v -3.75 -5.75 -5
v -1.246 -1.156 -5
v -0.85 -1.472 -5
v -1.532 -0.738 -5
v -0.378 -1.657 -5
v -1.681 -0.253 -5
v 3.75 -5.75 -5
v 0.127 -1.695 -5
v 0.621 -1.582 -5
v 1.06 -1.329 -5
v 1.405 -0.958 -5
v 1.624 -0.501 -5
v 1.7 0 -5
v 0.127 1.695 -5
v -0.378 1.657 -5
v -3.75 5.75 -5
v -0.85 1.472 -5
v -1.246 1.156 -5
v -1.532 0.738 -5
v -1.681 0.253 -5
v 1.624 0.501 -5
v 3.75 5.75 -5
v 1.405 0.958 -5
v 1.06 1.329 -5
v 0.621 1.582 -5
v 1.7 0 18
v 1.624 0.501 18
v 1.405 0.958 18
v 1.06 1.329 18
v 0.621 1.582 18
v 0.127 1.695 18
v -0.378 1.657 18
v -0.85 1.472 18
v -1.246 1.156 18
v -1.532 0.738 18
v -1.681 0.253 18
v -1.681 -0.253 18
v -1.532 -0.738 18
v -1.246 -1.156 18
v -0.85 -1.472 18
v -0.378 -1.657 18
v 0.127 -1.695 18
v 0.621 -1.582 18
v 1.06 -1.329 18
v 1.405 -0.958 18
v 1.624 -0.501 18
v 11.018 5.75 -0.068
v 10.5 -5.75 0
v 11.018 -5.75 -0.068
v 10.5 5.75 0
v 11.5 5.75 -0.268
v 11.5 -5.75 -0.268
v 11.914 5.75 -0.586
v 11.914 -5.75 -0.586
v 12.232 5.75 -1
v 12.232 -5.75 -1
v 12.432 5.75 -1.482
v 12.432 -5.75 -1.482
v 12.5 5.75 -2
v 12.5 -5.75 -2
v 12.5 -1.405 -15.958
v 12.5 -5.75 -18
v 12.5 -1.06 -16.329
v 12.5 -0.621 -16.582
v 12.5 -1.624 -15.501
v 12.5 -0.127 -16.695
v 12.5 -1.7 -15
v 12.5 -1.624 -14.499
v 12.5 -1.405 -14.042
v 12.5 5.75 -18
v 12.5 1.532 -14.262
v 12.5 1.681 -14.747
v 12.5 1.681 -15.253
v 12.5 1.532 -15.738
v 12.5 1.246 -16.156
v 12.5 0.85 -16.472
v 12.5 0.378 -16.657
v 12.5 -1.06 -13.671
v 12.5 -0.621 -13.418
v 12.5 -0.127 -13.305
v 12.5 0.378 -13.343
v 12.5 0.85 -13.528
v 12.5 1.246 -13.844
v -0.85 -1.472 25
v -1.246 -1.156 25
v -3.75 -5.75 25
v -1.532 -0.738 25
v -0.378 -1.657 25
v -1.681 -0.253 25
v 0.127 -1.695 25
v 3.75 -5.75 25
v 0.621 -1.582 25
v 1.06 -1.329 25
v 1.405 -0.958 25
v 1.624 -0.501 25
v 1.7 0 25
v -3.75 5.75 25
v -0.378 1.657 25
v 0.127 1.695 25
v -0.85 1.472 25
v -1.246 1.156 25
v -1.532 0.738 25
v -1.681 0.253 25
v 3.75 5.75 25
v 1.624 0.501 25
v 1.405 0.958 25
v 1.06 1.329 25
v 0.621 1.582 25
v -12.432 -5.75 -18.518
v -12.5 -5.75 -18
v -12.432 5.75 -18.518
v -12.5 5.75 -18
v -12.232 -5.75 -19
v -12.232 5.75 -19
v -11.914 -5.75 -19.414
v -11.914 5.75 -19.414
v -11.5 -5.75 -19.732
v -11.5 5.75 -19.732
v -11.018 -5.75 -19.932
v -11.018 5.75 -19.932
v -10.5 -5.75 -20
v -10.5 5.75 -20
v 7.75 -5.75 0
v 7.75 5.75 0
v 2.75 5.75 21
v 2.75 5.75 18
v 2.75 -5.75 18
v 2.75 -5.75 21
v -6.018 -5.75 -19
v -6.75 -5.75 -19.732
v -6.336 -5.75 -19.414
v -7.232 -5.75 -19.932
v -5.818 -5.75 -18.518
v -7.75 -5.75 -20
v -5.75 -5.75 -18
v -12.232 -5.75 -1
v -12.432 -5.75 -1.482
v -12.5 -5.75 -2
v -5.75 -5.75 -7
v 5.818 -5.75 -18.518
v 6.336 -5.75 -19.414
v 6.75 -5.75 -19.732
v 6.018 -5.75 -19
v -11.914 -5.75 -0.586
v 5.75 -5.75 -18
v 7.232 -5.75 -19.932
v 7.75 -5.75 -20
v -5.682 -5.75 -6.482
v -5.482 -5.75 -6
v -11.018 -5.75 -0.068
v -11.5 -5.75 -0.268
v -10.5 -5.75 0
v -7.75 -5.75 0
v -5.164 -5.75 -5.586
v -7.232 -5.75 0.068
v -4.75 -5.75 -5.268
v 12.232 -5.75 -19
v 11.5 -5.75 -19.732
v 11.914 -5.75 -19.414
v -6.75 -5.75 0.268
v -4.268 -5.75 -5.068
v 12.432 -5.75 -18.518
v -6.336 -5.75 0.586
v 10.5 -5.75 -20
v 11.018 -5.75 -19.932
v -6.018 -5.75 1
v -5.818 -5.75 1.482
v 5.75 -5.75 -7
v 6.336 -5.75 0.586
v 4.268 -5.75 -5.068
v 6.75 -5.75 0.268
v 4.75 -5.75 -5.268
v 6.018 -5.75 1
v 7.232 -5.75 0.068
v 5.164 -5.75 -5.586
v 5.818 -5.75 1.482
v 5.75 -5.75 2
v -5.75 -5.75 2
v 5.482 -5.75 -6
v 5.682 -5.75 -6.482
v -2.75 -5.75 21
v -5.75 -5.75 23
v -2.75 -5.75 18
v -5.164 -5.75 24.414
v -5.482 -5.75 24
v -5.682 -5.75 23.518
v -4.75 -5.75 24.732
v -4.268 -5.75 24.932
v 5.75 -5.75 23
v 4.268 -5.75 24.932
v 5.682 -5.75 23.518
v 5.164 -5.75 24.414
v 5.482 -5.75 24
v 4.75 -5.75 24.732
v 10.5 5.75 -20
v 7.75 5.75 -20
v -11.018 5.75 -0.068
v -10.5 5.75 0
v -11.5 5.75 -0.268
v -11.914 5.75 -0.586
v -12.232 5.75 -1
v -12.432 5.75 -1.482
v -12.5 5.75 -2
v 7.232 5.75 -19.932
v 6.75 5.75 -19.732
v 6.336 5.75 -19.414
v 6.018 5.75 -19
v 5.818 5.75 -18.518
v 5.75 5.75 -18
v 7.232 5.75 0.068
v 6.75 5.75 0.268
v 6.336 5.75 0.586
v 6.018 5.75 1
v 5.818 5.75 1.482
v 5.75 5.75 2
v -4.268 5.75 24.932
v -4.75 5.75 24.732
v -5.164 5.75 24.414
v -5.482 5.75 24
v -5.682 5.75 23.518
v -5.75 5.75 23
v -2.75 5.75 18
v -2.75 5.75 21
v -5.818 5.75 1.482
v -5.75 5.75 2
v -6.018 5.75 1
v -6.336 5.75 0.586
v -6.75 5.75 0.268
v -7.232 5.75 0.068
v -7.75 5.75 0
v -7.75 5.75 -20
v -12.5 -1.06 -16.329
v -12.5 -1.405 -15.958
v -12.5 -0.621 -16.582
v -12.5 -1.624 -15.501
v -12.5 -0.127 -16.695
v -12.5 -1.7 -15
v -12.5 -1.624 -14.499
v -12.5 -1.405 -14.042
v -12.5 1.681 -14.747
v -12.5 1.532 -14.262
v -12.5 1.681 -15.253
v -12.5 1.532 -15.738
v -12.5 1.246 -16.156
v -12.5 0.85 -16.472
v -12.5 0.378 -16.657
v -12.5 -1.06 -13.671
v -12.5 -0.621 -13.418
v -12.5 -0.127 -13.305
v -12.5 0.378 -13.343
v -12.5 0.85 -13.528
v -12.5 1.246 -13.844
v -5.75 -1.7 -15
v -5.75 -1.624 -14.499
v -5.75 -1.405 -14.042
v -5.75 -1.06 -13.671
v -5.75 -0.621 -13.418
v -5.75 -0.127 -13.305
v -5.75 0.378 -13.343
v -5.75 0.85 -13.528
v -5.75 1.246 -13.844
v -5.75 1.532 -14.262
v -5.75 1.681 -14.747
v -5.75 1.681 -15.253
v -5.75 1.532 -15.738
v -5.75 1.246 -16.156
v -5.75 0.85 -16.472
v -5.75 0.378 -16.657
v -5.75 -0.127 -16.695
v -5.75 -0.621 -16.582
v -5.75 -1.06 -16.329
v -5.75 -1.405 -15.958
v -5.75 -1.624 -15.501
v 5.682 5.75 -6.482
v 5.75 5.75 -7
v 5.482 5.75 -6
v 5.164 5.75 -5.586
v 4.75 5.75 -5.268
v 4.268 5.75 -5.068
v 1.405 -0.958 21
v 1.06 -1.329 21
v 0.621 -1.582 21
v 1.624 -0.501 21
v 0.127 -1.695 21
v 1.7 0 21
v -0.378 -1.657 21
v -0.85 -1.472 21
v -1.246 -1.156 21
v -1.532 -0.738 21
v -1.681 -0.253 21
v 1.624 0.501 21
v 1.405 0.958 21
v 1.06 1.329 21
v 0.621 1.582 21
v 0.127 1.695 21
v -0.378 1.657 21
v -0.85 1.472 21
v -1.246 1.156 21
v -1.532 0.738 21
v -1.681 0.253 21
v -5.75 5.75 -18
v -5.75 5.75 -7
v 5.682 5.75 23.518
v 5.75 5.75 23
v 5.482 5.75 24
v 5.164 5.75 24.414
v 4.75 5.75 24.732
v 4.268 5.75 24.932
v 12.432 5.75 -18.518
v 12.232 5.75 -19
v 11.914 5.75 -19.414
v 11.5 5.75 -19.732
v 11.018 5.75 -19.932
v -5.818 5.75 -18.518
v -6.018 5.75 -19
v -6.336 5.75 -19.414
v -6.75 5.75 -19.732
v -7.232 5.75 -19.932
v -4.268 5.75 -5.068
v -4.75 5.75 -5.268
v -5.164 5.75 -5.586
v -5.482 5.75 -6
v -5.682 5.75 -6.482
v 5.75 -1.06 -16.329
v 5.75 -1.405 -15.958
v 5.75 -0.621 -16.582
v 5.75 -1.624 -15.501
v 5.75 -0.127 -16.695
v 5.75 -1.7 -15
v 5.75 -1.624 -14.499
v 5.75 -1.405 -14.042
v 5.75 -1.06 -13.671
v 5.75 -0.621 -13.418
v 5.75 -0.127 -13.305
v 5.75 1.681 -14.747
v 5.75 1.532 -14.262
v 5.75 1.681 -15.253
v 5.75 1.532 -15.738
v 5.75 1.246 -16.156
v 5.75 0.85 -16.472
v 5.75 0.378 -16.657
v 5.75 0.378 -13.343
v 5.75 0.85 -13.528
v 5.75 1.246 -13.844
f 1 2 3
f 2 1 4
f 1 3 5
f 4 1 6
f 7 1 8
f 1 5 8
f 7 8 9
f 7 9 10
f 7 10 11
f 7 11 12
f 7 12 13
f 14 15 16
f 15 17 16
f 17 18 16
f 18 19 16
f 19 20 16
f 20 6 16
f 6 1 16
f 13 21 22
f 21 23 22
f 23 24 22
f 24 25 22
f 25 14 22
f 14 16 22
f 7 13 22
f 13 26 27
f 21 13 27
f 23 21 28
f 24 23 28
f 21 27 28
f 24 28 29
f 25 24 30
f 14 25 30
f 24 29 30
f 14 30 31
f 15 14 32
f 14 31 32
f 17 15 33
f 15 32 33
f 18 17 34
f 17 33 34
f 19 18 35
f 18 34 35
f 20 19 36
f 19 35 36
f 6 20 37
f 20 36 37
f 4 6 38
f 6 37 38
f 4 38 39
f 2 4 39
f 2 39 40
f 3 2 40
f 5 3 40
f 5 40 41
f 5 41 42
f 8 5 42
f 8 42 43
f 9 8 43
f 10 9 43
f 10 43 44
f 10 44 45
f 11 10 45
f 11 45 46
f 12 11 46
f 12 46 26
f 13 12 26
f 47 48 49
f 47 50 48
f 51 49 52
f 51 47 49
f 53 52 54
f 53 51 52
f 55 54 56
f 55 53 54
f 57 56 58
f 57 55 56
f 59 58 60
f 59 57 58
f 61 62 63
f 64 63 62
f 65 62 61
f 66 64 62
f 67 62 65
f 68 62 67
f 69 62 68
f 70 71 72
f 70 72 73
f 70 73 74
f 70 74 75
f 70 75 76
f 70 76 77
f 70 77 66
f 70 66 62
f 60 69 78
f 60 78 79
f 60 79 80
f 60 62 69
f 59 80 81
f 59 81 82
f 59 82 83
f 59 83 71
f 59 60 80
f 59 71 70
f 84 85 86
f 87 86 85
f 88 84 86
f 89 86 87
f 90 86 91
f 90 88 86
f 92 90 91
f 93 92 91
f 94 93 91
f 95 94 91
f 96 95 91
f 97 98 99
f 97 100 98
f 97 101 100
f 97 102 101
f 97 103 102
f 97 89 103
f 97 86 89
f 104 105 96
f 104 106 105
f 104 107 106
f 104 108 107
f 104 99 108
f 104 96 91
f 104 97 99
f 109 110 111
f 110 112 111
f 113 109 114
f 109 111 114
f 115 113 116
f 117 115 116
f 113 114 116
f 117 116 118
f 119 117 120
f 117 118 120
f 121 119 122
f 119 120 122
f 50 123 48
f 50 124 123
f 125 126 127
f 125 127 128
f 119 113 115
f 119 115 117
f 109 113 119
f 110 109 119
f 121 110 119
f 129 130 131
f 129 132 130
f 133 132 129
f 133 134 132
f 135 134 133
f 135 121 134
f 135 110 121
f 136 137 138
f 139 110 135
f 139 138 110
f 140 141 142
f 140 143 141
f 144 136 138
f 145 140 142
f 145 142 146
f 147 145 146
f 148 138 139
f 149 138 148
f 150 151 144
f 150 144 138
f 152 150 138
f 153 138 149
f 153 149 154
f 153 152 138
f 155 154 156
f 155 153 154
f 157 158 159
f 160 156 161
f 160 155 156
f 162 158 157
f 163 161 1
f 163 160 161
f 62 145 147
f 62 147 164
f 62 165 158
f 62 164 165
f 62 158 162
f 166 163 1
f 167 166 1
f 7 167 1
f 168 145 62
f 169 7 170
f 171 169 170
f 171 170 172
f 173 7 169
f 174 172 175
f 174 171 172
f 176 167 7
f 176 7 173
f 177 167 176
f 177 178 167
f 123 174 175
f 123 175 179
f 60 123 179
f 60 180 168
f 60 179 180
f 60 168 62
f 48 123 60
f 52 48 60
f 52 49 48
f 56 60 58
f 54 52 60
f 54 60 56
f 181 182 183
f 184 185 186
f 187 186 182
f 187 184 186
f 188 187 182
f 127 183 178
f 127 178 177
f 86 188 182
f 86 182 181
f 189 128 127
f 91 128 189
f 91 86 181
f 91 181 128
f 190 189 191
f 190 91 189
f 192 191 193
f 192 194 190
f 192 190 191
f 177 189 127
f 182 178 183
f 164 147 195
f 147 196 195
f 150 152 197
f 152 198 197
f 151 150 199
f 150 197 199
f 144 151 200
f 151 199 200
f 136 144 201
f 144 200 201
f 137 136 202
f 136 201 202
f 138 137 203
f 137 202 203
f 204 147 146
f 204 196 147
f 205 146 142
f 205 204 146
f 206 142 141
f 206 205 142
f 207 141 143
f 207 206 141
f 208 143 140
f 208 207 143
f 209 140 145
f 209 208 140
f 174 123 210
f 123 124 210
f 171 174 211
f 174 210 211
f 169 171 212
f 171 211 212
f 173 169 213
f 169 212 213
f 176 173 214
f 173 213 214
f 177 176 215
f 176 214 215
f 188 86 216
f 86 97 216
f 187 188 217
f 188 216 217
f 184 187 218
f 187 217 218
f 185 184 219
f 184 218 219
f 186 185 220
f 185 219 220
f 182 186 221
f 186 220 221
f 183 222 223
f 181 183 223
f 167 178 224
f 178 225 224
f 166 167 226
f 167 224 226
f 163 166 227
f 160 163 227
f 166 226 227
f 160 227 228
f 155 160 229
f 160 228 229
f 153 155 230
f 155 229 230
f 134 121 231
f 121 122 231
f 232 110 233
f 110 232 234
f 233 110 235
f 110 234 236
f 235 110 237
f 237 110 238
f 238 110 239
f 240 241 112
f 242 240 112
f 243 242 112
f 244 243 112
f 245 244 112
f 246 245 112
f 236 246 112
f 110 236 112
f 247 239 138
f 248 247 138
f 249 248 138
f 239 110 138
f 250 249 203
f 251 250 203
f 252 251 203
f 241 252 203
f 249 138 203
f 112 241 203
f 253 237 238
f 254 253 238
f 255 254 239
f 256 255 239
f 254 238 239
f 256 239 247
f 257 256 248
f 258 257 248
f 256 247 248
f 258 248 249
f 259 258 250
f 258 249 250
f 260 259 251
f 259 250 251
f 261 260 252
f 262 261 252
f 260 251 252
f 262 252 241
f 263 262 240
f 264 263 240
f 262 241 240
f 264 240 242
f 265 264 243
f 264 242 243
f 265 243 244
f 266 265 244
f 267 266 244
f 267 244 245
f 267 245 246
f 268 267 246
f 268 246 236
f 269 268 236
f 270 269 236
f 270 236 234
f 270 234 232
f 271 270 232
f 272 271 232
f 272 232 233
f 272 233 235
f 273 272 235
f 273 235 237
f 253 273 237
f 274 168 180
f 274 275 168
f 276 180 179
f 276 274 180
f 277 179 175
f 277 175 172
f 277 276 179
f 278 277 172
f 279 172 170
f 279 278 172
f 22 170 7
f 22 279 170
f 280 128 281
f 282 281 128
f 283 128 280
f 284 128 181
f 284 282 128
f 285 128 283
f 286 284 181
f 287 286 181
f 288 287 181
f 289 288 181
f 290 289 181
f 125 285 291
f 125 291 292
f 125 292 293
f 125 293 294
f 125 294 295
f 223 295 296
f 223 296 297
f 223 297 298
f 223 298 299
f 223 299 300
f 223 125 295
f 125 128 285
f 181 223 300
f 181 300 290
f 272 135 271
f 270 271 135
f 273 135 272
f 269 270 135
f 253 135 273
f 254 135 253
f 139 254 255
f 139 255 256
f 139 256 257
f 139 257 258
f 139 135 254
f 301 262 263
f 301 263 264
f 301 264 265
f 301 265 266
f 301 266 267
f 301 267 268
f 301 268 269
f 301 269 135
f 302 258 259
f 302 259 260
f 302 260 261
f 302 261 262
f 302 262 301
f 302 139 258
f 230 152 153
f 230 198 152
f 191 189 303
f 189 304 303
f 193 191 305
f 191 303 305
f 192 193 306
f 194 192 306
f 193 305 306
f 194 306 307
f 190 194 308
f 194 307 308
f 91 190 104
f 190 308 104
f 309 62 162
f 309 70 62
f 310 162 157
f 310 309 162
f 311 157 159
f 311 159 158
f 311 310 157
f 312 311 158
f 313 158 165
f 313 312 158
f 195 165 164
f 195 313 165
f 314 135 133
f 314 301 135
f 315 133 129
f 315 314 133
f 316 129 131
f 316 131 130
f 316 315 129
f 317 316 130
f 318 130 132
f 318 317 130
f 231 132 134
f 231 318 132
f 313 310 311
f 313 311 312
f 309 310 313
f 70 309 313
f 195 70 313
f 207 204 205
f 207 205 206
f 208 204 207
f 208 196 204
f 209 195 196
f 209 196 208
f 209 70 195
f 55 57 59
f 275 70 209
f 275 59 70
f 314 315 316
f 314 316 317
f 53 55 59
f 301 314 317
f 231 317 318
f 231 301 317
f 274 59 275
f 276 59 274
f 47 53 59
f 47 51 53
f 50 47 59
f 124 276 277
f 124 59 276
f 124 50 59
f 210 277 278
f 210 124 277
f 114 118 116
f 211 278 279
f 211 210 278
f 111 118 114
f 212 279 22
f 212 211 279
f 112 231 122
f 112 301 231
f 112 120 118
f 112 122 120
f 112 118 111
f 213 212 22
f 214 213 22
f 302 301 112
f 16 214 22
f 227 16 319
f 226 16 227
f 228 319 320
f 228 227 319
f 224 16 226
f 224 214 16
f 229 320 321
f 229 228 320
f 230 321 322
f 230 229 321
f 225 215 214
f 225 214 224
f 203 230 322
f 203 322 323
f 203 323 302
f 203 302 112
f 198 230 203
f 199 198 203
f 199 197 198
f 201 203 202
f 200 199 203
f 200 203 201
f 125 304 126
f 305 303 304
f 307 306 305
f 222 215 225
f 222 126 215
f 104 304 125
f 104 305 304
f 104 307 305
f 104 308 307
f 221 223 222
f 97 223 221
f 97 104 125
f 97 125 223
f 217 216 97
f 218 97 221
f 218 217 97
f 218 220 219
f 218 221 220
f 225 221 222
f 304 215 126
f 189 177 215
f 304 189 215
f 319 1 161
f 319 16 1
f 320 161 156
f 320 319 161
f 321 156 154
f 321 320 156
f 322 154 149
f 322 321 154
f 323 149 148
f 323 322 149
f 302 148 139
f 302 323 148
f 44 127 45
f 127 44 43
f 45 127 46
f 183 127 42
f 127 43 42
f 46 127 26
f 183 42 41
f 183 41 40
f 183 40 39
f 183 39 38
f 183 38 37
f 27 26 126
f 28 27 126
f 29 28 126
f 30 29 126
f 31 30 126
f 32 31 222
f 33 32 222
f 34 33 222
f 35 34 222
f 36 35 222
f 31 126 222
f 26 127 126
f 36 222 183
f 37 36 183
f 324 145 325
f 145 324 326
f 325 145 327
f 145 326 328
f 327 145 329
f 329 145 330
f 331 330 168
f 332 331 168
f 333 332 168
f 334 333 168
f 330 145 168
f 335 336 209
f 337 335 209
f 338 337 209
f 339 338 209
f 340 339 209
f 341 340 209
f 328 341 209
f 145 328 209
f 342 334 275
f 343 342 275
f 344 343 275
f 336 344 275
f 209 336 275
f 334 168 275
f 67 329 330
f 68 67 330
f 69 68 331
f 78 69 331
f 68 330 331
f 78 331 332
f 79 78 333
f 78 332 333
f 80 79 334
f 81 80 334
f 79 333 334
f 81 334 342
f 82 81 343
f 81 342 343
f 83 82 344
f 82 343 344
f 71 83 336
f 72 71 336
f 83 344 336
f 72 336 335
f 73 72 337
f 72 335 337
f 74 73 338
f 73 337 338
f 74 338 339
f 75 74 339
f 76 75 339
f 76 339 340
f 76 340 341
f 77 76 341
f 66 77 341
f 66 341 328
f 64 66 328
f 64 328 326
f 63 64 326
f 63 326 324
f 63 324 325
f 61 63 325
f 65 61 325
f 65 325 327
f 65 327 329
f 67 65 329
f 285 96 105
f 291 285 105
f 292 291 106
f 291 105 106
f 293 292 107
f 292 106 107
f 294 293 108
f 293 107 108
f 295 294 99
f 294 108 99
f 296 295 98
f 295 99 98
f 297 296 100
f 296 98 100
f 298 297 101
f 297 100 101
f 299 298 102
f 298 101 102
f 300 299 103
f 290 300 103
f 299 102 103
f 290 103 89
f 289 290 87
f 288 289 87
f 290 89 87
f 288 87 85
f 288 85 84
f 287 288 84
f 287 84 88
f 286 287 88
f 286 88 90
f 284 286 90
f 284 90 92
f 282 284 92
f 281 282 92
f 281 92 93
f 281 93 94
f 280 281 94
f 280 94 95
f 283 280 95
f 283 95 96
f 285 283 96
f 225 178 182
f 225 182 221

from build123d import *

# Parameters (mm, degrees)
F0_W     = 6.75
F0_H     = 11.5
F0_W_2   = 11.5
F1_DEPTH = 5
F2_DEPTH = 20
F3_DEPTH = 25
F4_R     = 1.7
F5_DEPTH = 25.001
F6_W     = 5.5
F6_H     = 3
F7_DEPTH = 11.501
F8_R     = 1.7
F9_DEPTH = 45.001
F10_R    = 2


with BuildPart() as f1:
    # F0 (on Top) → F1 (new body)
    with BuildSketch(Plane.XY):
        with Locations((-9.125, 0)):
            Rectangle(F0_W, F0_H)
        with Locations((9.125, 0)):
            Rectangle(F0_W, F0_H)
        Rectangle(F0_W_2, F0_H)
    extrude(amount=-F1_DEPTH)

    # F0 (on Top) → F2 (join)
    with BuildSketch(Plane.XY):
        with Locations((9.125, 0)):
            Rectangle(F0_W, F0_H)
        with Locations((-9.125, 0)):
            Rectangle(F0_W, F0_H)
    extrude(amount=-F2_DEPTH)

    # F0 (on Top) → F3 (join)
    with BuildSketch(Plane.XY):
        Rectangle(F0_W_2, F0_H)
    extrude(amount=F3_DEPTH)

    # F4 (on face) → F5 (cut, through all)
    with BuildSketch(Plane(origin=(-12.5, 0, 0), x_dir=(0, -1, 0), z_dir=(-1, 0, 0))):
        with Locations((0, -15)):
            Circle(F4_R)
    extrude(amount=-F5_DEPTH, mode=Mode.SUBTRACT)

    # F6 (on face) → F7 (cut, through all)
    with BuildSketch(Plane(origin=(0, 5.75, 0), x_dir=(-1, 0, 0), z_dir=(0, 1, 0))):
        with Locations((0, 19.5)):
            Rectangle(F6_W, F6_H)
    extrude(amount=-F7_DEPTH, mode=Mode.SUBTRACT)

    # F8 (on face) → F9 (cut, through all)
    with BuildSketch(Plane.XY.offset(25)):
        Circle(F8_R)
    extrude(amount=-F9_DEPTH, mode=Mode.SUBTRACT)

    # F10
    f10_edges = [f1.edges().sort_by_distance(p)[0] for p in [
        (-5.75, 0, -20),
        (-12.5, 0, -20),
        (-5.75, 0, -5),
        (5.75, 0, -5),
        (5.75, 0, -20),
        (12.5, 0, -20),
        (12.5, 0, 0),
        (-12.5, 0, 0),
        (-5.75, 0, 0),
        (-5.75, 0, 25),
        (5.75, 0, 25),
        (5.75, 0, 0),
    ]]
    fillet(f10_edges, radius=F10_R)


solid = f1.part
